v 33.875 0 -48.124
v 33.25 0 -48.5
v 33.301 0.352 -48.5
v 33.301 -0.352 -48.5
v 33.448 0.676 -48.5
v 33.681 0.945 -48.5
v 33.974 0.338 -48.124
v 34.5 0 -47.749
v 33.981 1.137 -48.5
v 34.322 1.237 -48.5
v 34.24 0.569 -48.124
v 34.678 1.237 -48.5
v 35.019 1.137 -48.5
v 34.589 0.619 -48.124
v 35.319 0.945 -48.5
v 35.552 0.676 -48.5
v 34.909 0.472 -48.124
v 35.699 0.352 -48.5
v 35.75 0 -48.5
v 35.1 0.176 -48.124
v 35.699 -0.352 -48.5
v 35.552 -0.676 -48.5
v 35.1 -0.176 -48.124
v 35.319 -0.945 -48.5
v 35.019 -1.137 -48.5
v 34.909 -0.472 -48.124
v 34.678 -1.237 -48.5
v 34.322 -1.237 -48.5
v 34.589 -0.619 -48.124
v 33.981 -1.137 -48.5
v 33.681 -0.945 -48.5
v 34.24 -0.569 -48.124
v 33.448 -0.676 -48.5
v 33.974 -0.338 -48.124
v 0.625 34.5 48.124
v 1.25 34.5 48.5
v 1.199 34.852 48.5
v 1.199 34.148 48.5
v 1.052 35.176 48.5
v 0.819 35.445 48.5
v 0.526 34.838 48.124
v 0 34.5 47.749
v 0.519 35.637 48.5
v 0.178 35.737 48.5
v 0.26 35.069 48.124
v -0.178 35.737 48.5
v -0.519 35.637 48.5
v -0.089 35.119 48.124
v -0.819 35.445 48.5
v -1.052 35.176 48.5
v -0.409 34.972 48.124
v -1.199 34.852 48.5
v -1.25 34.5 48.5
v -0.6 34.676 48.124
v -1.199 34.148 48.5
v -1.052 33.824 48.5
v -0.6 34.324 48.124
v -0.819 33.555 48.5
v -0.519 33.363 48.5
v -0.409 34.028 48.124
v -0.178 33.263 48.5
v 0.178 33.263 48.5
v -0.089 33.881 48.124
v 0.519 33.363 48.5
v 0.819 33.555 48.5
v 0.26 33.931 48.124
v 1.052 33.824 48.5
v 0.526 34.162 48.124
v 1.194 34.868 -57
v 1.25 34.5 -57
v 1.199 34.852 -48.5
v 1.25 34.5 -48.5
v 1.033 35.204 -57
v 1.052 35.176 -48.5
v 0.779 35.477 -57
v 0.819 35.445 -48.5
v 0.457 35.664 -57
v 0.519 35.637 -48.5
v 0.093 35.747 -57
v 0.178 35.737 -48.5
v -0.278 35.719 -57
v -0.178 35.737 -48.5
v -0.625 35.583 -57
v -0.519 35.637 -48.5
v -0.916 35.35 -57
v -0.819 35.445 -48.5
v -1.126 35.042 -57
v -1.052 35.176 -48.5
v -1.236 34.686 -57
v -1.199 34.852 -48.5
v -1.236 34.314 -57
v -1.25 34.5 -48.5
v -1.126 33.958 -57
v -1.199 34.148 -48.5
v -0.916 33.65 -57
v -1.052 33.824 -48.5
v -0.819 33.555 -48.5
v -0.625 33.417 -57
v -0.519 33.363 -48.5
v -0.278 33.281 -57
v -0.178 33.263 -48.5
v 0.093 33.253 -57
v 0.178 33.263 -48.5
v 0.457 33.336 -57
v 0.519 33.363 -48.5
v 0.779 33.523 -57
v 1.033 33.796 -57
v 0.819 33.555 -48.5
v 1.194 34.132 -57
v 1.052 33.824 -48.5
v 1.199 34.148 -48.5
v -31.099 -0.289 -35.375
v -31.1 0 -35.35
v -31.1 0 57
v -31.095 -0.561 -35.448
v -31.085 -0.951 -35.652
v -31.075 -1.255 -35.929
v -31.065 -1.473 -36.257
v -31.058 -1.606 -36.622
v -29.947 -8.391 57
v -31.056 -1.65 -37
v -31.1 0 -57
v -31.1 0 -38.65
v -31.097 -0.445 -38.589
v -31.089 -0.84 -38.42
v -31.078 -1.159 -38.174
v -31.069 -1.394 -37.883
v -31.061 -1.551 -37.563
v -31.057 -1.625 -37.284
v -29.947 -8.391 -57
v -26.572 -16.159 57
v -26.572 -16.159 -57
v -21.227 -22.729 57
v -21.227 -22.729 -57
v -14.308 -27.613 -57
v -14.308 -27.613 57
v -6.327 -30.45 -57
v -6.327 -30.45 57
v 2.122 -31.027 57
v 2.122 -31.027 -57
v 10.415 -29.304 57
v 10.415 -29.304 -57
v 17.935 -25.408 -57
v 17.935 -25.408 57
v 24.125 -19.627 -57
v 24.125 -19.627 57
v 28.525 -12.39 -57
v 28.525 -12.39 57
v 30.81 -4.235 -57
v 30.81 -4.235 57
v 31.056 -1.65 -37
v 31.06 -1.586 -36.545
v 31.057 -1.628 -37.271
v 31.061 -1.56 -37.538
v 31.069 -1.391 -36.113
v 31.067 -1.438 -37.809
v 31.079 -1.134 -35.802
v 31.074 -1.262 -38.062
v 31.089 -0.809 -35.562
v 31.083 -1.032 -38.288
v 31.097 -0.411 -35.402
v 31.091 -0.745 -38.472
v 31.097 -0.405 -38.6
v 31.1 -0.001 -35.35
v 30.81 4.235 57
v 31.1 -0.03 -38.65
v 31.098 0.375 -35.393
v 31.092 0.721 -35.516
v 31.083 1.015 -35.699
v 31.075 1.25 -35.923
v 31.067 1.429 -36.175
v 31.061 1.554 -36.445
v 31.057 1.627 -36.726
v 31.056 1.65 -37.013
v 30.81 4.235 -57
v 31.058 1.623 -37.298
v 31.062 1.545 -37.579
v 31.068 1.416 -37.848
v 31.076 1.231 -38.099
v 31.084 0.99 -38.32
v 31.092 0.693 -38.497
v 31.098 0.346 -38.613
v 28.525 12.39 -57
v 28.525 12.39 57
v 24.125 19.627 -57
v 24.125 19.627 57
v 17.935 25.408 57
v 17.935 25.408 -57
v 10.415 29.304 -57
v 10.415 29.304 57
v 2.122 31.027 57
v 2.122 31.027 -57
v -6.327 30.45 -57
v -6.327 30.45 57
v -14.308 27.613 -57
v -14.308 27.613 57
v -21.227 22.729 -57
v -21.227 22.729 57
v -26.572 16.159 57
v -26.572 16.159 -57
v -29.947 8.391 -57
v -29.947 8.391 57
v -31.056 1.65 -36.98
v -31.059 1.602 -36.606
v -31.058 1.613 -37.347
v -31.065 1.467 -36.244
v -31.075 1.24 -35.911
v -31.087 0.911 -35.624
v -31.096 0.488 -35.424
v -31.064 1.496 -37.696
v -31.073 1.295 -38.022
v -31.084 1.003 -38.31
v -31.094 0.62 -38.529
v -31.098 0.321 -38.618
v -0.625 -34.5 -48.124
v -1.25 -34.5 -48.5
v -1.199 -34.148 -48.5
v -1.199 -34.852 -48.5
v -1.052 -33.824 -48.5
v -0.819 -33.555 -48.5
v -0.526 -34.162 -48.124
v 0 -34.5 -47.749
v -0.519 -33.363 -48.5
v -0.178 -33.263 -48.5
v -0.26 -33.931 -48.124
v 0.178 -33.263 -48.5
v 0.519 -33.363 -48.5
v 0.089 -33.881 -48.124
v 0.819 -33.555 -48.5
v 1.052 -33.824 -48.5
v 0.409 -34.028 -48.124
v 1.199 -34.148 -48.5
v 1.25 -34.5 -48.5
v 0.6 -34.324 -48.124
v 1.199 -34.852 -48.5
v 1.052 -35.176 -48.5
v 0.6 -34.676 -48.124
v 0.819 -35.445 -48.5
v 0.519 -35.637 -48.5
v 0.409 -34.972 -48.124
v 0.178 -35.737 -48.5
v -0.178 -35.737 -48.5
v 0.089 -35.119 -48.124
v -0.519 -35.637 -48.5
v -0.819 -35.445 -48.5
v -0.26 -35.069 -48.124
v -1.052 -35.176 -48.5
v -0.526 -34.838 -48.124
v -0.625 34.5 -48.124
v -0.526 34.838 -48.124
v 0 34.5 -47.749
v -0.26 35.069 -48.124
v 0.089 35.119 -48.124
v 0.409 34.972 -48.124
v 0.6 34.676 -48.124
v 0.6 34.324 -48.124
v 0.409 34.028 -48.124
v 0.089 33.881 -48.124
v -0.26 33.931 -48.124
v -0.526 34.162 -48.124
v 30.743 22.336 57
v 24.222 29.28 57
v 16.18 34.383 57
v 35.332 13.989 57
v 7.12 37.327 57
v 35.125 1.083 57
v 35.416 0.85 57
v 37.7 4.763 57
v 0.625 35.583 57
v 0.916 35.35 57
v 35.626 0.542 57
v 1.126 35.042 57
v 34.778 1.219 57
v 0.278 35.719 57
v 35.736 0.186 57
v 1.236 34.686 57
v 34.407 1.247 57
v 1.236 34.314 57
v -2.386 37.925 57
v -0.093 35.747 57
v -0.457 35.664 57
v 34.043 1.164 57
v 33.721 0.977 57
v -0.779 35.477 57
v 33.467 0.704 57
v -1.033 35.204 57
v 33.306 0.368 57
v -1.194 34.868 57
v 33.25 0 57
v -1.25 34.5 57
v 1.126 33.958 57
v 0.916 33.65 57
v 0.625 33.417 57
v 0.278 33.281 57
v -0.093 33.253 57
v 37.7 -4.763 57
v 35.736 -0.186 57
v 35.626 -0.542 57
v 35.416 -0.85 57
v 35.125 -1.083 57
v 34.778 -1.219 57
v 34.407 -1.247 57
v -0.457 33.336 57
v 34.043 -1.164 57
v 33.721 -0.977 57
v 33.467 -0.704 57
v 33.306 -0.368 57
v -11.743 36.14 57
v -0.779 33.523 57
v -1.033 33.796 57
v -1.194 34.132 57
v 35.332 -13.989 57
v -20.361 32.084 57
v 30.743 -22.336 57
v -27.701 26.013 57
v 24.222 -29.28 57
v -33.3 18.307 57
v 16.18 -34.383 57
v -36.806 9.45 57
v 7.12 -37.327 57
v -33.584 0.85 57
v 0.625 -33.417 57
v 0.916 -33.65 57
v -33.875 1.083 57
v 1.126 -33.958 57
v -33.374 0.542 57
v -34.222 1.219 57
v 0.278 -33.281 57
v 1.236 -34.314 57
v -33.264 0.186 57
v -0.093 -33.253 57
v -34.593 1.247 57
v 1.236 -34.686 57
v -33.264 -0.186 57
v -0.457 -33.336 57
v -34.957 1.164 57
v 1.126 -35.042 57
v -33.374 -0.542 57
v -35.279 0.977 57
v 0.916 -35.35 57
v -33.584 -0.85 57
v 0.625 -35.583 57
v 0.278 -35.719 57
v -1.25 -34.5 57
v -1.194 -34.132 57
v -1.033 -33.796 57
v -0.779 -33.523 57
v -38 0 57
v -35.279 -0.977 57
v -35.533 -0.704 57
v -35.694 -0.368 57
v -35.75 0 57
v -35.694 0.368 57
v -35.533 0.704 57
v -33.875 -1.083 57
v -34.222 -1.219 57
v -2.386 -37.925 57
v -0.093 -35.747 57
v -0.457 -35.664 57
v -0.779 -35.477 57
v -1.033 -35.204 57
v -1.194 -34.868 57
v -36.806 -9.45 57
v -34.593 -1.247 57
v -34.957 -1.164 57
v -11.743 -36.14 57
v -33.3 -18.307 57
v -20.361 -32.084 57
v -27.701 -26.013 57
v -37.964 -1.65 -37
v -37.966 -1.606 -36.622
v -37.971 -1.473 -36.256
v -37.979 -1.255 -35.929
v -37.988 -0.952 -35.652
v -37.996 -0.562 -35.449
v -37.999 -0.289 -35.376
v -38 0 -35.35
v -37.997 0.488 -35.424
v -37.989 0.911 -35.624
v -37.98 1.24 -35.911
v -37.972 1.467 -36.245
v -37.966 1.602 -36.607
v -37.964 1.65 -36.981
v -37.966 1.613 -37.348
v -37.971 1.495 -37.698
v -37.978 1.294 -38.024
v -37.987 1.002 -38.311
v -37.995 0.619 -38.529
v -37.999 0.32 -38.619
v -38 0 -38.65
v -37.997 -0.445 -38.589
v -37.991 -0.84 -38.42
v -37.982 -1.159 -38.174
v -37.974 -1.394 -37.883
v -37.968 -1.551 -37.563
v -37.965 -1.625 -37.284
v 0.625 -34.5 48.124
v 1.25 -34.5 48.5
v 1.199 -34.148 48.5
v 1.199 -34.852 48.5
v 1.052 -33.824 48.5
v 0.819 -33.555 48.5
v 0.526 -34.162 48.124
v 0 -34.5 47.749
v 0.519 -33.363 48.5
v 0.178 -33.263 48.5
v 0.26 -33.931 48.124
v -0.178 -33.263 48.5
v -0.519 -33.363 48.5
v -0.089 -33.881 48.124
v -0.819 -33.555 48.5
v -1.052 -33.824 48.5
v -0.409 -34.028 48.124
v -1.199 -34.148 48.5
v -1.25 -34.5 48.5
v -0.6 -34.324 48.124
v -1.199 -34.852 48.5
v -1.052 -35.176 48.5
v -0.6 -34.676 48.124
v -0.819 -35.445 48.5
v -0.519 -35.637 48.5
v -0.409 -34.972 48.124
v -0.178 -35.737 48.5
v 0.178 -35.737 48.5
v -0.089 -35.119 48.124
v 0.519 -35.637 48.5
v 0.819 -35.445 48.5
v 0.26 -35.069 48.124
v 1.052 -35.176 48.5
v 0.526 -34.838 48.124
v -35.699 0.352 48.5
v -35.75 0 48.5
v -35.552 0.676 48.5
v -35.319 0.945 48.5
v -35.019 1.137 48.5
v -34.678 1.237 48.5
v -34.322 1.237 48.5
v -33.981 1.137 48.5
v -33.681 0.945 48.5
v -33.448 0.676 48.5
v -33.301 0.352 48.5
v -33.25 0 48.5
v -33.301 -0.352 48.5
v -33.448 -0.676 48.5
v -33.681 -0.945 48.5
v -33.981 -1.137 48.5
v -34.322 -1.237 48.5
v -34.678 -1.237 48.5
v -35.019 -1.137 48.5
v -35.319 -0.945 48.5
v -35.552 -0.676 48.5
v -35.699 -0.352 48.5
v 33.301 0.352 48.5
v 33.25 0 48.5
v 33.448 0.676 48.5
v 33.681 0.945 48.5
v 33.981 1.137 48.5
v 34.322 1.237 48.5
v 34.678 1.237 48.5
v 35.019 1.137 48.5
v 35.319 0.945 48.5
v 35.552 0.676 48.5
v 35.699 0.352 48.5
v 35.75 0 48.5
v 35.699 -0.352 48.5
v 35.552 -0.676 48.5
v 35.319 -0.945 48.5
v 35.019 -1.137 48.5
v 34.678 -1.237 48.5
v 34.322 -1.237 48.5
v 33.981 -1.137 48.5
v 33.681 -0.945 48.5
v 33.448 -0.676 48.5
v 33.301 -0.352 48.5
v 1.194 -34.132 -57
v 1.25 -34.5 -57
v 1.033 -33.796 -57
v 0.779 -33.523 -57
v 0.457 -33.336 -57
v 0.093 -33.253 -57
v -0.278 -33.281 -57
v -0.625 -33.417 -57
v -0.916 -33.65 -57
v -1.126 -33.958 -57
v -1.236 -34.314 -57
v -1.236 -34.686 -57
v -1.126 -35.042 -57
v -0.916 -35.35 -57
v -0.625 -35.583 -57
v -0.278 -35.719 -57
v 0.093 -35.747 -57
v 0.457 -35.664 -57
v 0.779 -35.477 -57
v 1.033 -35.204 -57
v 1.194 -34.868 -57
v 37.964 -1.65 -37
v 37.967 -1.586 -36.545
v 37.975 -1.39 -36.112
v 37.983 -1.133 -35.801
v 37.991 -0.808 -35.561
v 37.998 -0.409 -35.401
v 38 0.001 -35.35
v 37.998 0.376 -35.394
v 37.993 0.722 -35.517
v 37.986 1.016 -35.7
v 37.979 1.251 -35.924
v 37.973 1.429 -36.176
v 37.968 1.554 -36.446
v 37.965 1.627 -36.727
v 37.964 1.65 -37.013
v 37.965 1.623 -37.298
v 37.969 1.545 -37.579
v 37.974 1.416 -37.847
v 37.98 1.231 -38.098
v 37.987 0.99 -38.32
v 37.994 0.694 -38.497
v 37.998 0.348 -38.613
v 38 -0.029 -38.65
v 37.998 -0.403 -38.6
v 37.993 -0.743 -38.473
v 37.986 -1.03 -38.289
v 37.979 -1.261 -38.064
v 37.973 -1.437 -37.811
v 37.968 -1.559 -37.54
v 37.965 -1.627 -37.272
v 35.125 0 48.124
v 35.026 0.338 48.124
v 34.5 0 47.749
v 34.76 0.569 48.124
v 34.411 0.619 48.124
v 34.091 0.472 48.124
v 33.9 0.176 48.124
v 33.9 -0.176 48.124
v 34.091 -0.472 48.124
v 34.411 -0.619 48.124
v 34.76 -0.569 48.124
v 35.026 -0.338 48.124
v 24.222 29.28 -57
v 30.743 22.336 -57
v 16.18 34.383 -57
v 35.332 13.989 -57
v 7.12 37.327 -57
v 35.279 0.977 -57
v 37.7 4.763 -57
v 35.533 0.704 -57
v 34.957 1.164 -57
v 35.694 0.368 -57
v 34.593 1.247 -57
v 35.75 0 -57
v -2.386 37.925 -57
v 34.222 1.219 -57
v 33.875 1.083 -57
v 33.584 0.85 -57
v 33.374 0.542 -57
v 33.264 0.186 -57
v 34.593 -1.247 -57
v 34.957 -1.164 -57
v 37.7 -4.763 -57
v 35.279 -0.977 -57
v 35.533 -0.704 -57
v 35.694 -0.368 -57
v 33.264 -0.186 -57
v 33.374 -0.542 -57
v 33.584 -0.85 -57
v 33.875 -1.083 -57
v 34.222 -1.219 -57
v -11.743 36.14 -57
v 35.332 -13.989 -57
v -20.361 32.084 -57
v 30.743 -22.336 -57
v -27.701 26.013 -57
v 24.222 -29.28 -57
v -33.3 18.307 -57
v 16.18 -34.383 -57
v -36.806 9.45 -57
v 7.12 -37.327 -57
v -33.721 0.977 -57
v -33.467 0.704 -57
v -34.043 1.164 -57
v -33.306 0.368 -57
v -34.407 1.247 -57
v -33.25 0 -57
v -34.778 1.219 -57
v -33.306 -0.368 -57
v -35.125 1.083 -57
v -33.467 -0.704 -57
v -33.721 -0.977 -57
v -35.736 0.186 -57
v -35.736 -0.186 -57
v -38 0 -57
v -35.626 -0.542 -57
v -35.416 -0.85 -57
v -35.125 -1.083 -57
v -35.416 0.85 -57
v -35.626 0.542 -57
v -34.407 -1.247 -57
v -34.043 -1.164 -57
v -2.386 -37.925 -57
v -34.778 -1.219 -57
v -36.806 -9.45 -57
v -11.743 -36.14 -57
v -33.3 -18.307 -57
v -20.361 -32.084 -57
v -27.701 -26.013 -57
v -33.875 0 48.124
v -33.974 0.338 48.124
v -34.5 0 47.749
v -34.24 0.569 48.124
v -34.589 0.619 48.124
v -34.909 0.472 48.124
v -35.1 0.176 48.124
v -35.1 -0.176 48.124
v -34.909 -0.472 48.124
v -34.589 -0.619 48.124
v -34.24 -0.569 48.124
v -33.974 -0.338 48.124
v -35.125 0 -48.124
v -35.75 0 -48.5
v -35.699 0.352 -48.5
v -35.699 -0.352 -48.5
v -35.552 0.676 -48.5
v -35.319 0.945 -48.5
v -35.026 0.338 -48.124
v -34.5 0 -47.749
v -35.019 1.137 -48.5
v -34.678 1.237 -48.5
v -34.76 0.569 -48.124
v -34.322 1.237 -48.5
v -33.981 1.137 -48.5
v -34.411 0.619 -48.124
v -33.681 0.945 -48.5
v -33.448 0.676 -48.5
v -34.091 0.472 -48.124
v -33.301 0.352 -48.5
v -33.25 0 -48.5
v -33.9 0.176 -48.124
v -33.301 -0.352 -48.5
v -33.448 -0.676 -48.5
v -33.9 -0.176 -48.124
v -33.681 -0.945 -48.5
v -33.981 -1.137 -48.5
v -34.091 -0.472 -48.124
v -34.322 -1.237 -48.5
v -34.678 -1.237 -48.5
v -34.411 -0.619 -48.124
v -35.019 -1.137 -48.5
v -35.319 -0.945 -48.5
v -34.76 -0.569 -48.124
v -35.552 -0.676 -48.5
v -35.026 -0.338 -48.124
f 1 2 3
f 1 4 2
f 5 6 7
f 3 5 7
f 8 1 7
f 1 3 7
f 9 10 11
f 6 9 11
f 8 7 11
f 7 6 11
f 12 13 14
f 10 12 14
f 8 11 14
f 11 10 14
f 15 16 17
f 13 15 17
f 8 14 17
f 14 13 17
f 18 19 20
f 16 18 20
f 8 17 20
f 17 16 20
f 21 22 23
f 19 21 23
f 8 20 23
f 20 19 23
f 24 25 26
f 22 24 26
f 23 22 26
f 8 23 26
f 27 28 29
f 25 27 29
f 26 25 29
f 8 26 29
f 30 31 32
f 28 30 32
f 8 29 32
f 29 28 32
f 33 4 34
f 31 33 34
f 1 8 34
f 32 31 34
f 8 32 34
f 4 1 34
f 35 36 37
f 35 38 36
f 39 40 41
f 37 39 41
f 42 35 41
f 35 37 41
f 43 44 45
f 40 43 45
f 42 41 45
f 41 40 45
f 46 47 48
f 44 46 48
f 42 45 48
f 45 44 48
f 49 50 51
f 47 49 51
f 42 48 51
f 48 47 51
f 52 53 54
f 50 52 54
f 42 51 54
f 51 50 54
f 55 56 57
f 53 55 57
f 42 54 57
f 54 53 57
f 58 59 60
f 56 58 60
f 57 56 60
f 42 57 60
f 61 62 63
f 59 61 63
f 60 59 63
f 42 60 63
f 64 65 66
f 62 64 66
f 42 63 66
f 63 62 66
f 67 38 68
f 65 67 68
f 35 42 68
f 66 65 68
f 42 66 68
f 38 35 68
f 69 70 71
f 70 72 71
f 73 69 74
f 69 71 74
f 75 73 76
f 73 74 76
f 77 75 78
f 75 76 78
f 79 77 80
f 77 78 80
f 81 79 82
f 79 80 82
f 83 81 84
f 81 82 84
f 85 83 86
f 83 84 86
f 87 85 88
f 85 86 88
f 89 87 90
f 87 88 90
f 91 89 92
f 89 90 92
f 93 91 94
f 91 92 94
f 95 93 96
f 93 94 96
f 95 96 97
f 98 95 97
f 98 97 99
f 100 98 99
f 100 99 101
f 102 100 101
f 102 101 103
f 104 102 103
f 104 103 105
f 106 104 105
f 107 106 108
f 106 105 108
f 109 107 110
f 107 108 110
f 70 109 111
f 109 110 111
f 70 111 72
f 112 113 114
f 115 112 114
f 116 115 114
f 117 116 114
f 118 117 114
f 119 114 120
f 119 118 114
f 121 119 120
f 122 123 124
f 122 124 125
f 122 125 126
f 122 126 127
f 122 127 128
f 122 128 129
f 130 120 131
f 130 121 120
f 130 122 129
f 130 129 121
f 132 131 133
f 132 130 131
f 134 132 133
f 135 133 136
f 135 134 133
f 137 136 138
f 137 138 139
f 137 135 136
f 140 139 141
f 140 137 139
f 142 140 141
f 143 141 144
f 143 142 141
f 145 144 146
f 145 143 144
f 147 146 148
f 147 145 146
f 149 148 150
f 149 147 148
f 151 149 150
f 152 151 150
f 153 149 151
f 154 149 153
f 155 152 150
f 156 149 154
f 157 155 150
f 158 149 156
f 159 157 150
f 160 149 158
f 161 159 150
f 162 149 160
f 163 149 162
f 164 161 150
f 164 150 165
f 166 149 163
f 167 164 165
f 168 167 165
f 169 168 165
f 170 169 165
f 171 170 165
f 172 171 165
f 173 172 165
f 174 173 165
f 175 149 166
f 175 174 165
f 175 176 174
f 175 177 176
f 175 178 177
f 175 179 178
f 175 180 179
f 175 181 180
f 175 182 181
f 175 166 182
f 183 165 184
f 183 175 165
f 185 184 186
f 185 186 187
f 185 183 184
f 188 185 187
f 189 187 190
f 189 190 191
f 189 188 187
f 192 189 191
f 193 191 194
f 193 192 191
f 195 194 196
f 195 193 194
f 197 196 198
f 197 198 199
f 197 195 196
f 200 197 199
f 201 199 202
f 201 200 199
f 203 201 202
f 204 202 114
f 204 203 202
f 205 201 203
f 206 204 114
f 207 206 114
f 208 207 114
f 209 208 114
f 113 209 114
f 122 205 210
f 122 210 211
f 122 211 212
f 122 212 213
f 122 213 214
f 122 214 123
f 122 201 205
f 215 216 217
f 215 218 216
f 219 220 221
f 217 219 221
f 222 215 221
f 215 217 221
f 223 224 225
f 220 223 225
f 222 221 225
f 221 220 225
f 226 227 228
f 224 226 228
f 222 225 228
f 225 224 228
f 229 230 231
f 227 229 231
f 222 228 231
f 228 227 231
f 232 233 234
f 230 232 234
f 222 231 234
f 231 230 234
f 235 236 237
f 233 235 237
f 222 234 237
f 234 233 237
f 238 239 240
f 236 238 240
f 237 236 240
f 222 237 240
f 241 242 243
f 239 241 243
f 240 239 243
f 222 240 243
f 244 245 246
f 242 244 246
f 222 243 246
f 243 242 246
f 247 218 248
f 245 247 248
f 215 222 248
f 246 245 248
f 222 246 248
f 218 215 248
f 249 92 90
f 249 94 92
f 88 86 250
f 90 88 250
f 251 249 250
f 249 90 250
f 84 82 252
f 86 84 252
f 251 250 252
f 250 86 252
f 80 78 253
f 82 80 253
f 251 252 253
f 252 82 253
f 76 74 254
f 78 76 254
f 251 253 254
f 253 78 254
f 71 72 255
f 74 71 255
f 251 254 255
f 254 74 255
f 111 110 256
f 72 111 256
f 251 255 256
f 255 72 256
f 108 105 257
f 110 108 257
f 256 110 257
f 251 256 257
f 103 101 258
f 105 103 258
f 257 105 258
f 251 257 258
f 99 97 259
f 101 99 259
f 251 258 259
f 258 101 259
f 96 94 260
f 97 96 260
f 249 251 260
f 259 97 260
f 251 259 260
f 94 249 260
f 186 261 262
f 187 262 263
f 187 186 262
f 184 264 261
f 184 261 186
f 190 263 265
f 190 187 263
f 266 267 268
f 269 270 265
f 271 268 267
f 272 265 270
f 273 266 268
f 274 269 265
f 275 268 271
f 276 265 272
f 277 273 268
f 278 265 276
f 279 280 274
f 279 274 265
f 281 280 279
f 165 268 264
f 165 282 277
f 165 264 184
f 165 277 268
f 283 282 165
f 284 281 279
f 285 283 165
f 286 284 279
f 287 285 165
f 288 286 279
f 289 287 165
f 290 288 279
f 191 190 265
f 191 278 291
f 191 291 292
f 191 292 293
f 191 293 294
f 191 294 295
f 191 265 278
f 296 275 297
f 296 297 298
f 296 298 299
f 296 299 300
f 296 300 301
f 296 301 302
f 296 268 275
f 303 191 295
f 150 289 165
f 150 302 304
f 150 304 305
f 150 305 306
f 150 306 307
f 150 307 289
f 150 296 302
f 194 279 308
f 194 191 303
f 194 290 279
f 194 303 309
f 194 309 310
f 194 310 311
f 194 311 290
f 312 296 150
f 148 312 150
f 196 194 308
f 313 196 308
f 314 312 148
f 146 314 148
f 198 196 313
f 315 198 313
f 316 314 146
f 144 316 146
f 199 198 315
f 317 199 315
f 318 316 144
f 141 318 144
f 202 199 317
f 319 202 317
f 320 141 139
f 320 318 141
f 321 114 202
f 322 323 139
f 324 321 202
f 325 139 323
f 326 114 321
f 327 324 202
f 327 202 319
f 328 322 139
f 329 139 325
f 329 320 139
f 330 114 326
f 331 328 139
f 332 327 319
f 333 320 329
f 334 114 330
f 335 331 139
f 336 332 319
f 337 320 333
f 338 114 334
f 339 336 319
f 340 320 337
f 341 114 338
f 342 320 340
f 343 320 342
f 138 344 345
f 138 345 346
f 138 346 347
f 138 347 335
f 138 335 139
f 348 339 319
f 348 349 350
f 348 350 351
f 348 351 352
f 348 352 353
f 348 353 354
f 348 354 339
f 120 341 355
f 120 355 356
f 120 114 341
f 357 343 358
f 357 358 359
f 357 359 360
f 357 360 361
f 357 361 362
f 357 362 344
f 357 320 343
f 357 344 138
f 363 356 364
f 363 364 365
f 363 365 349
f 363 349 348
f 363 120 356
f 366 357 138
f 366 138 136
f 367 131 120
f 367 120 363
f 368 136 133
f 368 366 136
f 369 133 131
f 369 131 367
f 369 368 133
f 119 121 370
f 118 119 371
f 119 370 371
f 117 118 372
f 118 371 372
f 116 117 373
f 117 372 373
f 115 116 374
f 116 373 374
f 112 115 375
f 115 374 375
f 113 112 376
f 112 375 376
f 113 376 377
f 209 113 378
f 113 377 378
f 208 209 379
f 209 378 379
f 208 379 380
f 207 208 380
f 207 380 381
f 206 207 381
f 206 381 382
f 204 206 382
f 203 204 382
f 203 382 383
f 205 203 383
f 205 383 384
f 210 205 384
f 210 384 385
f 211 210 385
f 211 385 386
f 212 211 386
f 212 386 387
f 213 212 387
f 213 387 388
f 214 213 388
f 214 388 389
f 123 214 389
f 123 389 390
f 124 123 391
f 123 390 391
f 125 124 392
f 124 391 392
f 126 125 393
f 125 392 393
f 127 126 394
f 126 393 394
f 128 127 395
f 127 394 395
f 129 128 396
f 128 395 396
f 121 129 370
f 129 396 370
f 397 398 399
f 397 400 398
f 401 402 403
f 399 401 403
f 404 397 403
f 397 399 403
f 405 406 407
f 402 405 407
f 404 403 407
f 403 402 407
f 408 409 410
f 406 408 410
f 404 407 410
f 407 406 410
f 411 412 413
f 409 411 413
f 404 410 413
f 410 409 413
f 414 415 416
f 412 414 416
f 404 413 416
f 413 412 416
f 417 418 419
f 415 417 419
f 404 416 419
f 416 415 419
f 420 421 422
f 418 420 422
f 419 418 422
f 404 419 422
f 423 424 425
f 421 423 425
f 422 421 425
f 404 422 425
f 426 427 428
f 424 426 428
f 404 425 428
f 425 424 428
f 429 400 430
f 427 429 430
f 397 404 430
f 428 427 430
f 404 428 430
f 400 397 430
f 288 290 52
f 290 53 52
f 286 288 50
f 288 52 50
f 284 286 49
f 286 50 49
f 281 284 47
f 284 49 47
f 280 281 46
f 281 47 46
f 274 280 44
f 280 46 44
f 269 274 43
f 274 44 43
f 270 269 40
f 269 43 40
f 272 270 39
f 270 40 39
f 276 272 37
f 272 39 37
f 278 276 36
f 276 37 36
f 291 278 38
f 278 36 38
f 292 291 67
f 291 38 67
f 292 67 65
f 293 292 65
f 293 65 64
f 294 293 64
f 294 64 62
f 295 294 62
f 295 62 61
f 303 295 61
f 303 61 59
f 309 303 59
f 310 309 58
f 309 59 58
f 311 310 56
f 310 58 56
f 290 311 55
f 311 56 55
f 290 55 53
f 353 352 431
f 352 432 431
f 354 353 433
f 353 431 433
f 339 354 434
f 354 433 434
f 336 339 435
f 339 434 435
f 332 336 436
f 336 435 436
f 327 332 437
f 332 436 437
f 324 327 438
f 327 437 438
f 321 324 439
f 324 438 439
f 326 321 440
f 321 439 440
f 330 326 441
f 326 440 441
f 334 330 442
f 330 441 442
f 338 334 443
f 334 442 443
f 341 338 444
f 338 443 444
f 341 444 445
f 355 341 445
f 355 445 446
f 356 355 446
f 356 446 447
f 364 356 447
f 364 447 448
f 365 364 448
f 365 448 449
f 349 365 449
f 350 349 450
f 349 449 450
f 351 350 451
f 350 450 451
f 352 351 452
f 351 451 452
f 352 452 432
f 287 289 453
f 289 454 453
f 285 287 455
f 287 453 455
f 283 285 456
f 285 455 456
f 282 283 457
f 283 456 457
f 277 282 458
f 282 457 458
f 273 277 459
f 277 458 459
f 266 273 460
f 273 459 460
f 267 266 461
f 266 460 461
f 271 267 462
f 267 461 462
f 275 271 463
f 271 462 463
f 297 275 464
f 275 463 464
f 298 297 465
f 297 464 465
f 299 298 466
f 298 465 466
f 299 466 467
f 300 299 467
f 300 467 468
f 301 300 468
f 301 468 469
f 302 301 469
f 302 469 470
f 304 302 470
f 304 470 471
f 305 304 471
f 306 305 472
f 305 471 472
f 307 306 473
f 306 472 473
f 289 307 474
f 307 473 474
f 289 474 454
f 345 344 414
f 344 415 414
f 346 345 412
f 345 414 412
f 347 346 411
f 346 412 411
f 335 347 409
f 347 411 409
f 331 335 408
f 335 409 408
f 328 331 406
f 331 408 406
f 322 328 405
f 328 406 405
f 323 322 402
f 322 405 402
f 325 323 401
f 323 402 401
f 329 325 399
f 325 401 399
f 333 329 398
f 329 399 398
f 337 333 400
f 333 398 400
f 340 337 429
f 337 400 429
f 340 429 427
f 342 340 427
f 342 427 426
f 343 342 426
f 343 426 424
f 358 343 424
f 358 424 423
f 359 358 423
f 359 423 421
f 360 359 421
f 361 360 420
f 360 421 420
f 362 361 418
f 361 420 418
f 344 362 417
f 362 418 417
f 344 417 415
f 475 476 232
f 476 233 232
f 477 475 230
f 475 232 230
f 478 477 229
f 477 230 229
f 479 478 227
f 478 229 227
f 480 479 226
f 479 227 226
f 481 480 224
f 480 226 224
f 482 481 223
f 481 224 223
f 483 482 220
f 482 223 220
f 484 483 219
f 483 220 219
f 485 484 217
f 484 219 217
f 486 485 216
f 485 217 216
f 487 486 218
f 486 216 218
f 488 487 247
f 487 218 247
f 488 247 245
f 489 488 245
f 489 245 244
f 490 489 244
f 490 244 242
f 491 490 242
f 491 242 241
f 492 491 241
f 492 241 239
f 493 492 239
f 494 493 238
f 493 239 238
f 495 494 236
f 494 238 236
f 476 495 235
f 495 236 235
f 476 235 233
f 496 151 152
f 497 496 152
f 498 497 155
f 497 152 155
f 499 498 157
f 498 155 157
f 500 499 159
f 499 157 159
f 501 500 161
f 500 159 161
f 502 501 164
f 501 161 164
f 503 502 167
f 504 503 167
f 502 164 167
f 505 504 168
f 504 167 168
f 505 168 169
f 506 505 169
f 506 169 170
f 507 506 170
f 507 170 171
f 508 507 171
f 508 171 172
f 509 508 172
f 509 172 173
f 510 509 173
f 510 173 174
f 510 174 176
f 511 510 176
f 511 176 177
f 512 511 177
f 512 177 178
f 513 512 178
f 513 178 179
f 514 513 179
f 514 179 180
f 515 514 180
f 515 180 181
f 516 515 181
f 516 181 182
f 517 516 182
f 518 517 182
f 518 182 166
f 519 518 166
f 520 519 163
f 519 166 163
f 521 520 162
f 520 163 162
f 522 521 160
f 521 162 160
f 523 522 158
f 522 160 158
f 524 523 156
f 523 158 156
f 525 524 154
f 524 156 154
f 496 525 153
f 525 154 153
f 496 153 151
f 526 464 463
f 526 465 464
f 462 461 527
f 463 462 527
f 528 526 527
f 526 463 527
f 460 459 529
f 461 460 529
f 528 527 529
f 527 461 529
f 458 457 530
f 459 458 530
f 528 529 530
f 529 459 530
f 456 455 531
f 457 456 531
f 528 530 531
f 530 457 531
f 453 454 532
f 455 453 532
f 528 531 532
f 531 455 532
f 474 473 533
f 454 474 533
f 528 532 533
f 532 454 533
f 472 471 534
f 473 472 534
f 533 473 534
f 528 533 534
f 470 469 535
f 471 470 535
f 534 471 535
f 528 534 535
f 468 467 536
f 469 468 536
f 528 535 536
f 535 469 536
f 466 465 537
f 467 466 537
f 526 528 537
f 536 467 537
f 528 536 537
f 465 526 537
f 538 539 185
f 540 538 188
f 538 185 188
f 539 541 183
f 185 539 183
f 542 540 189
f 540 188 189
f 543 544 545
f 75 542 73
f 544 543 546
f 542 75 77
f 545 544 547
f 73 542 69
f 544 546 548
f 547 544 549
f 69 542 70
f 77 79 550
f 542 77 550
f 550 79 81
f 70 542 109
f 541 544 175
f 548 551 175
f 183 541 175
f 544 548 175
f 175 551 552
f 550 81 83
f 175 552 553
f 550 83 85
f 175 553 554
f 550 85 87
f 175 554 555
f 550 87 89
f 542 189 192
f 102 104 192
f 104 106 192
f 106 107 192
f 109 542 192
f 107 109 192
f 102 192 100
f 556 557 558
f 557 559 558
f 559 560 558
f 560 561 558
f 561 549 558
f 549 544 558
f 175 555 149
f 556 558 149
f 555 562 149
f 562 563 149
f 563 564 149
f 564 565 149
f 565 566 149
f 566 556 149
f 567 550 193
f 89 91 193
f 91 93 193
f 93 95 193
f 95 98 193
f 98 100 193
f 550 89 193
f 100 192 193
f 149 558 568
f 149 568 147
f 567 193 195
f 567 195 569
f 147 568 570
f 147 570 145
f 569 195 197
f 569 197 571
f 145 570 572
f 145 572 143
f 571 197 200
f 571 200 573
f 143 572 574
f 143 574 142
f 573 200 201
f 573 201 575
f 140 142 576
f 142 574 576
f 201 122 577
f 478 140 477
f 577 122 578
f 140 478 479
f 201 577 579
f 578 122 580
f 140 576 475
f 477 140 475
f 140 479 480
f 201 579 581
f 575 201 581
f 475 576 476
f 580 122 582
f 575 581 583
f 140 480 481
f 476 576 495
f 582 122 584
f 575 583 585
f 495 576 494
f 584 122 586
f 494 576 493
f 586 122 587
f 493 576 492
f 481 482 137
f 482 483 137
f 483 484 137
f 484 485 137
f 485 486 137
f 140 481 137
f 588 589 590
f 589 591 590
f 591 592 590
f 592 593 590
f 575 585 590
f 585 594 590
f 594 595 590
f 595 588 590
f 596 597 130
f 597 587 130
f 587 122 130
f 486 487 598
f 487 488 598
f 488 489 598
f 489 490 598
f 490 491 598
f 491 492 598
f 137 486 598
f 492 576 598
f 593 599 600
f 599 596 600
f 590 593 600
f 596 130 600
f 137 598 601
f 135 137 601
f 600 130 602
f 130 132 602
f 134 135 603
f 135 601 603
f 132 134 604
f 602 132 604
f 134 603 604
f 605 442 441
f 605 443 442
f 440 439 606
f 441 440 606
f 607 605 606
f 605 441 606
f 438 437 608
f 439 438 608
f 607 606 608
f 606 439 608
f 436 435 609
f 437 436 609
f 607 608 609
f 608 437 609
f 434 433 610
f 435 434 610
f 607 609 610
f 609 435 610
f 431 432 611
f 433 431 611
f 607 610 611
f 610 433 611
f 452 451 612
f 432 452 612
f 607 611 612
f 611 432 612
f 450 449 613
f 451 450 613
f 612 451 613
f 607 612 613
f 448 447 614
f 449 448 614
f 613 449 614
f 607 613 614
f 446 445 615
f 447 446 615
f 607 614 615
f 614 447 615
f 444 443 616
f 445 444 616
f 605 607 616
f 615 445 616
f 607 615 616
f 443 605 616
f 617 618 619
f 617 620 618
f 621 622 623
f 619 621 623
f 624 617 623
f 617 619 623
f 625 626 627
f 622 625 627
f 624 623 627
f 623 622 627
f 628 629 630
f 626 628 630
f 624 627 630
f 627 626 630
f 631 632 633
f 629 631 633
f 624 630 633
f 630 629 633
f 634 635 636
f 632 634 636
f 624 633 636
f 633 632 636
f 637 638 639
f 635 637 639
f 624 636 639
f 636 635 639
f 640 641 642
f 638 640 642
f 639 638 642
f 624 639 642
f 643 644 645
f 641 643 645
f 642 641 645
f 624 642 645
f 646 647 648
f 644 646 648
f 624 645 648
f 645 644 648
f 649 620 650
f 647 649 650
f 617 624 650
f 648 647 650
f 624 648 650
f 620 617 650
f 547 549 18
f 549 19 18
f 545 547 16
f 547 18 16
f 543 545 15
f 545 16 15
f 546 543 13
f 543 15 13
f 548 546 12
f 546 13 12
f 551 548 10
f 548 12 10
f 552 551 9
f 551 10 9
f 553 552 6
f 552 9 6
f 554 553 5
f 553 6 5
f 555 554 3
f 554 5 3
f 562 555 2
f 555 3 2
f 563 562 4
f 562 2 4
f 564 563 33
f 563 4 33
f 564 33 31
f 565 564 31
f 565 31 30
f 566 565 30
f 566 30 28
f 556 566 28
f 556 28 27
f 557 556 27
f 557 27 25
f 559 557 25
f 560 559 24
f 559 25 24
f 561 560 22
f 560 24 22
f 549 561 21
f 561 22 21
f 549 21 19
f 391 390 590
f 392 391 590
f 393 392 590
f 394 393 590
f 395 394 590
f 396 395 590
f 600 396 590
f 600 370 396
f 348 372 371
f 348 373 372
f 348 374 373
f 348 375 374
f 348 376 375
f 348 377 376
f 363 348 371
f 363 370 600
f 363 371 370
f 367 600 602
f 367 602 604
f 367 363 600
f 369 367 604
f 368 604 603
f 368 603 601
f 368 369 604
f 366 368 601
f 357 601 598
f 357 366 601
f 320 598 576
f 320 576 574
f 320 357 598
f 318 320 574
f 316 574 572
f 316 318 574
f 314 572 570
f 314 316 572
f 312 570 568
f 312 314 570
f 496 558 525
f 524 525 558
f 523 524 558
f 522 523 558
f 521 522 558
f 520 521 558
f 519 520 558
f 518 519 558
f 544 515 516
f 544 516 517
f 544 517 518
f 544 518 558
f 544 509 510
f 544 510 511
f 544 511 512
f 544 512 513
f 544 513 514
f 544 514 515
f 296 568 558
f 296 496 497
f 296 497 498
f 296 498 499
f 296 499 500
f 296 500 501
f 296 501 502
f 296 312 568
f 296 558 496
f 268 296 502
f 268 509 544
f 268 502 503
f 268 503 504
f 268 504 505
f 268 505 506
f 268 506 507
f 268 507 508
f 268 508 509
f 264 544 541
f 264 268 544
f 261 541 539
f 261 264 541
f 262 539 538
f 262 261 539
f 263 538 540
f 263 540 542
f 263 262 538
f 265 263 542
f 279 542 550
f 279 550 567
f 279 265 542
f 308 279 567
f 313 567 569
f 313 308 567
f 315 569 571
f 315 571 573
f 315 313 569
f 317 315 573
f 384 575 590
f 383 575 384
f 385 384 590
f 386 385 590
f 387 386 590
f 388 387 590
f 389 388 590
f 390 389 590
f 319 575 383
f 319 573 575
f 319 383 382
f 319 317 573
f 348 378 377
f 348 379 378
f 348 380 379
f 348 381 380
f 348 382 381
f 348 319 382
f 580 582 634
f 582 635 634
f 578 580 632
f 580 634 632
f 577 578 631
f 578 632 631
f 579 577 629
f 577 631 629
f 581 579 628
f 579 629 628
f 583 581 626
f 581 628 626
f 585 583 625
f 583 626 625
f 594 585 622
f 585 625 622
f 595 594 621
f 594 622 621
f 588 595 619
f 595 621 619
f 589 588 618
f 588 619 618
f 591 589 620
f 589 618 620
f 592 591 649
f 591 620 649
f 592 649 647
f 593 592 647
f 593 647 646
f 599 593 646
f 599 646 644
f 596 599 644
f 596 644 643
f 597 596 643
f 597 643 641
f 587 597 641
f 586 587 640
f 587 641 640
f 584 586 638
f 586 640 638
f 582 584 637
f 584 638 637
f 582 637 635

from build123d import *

# Parameters (mm, degrees)
SKETCH_1_R                   = 38
SKETCH_1_R_2                 = 31.1
EXTRUDE_1_DEPTH              = 57
HOLE_WIZARD_M3_1_D           = 2.5
HOLE_WIZARD_M3_1_DEPTH       = 8.5
HOLE_WIZARD_M3_1_TIP         = 0.751075774
HOLE_WIZARD_M3_3_D           = 2.5
HOLE_WIZARD_M3_3_DEPTH       = 8.5
HOLE_WIZARD_M3_3_TIP         = 0.751075774
HOLE_WIZARD_M4_1_D           = 3.3
HOLE_WIZARD_M4_1_ON_FACE_2_D = 3.3


with BuildPart() as part:
    # 草图1 → 凸台-拉伸1 (new, symmetric)
    with BuildSketch(Plane.XY):
        with Locations(Location((0, 0, 0), (0, 0, 180))):
            Circle(SKETCH_1_R)
        with Locations(Location((0, 0, 0), (0, 0, 180))):
            Circle(SKETCH_1_R_2, mode=Mode.SUBTRACT)
    extrude(amount=EXTRUDE_1_DEPTH, both=True)

    # M3 螺纹孔1
    with Locations(Plane.XY.offset(57)):
        with Locations((0, 34.5), (34.5, 0), (0, -34.5), (-34.5, 0)):
            Hole(HOLE_WIZARD_M3_1_D / 2, depth=HOLE_WIZARD_M3_1_DEPTH)
            with Locations((0, 0, -(HOLE_WIZARD_M3_1_DEPTH + HOLE_WIZARD_M3_1_TIP / 2))):  # 118° drill point
                Cone(0, HOLE_WIZARD_M3_1_D / 2, HOLE_WIZARD_M3_1_TIP, mode=Mode.SUBTRACT)

    # M3 螺纹孔3
    with Locations(Plane(origin=(13.806274772, 28.987165745, -57), x_dir=(-1, 0, 0), z_dir=(0, 0, -1))):
        with Locations((48.306274772, -28.987165745), (13.806274772, -63.487165745), (-20.693725228, -28.987165745), (13.806274772, 5.512834255)):
            Hole(HOLE_WIZARD_M3_3_D / 2, depth=HOLE_WIZARD_M3_3_DEPTH)
            with Locations((0, 0, -(HOLE_WIZARD_M3_3_DEPTH + HOLE_WIZARD_M3_3_TIP / 2))):  # 118° drill point
                Cone(0, HOLE_WIZARD_M3_3_D / 2, HOLE_WIZARD_M3_3_TIP, mode=Mode.SUBTRACT)

    # M4 螺纹孔1 (through all)
    with Locations(Plane(origin=(38, 0, -37), x_dir=(0, 1, 0), z_dir=(1, 0, 0))):
        with Locations((0, 0)):
            Hole(HOLE_WIZARD_M4_1_D / 2)

    # M4 螺纹孔1 on face 2 (through all)
    with Locations(Plane(origin=(-38, 0, -37), x_dir=(0, 0, -1), z_dir=(-1, 0, 0))):
        with Locations((0, 0)):
            Hole(HOLE_WIZARD_M4_1_ON_FACE_2_D / 2)


solid = part.part
